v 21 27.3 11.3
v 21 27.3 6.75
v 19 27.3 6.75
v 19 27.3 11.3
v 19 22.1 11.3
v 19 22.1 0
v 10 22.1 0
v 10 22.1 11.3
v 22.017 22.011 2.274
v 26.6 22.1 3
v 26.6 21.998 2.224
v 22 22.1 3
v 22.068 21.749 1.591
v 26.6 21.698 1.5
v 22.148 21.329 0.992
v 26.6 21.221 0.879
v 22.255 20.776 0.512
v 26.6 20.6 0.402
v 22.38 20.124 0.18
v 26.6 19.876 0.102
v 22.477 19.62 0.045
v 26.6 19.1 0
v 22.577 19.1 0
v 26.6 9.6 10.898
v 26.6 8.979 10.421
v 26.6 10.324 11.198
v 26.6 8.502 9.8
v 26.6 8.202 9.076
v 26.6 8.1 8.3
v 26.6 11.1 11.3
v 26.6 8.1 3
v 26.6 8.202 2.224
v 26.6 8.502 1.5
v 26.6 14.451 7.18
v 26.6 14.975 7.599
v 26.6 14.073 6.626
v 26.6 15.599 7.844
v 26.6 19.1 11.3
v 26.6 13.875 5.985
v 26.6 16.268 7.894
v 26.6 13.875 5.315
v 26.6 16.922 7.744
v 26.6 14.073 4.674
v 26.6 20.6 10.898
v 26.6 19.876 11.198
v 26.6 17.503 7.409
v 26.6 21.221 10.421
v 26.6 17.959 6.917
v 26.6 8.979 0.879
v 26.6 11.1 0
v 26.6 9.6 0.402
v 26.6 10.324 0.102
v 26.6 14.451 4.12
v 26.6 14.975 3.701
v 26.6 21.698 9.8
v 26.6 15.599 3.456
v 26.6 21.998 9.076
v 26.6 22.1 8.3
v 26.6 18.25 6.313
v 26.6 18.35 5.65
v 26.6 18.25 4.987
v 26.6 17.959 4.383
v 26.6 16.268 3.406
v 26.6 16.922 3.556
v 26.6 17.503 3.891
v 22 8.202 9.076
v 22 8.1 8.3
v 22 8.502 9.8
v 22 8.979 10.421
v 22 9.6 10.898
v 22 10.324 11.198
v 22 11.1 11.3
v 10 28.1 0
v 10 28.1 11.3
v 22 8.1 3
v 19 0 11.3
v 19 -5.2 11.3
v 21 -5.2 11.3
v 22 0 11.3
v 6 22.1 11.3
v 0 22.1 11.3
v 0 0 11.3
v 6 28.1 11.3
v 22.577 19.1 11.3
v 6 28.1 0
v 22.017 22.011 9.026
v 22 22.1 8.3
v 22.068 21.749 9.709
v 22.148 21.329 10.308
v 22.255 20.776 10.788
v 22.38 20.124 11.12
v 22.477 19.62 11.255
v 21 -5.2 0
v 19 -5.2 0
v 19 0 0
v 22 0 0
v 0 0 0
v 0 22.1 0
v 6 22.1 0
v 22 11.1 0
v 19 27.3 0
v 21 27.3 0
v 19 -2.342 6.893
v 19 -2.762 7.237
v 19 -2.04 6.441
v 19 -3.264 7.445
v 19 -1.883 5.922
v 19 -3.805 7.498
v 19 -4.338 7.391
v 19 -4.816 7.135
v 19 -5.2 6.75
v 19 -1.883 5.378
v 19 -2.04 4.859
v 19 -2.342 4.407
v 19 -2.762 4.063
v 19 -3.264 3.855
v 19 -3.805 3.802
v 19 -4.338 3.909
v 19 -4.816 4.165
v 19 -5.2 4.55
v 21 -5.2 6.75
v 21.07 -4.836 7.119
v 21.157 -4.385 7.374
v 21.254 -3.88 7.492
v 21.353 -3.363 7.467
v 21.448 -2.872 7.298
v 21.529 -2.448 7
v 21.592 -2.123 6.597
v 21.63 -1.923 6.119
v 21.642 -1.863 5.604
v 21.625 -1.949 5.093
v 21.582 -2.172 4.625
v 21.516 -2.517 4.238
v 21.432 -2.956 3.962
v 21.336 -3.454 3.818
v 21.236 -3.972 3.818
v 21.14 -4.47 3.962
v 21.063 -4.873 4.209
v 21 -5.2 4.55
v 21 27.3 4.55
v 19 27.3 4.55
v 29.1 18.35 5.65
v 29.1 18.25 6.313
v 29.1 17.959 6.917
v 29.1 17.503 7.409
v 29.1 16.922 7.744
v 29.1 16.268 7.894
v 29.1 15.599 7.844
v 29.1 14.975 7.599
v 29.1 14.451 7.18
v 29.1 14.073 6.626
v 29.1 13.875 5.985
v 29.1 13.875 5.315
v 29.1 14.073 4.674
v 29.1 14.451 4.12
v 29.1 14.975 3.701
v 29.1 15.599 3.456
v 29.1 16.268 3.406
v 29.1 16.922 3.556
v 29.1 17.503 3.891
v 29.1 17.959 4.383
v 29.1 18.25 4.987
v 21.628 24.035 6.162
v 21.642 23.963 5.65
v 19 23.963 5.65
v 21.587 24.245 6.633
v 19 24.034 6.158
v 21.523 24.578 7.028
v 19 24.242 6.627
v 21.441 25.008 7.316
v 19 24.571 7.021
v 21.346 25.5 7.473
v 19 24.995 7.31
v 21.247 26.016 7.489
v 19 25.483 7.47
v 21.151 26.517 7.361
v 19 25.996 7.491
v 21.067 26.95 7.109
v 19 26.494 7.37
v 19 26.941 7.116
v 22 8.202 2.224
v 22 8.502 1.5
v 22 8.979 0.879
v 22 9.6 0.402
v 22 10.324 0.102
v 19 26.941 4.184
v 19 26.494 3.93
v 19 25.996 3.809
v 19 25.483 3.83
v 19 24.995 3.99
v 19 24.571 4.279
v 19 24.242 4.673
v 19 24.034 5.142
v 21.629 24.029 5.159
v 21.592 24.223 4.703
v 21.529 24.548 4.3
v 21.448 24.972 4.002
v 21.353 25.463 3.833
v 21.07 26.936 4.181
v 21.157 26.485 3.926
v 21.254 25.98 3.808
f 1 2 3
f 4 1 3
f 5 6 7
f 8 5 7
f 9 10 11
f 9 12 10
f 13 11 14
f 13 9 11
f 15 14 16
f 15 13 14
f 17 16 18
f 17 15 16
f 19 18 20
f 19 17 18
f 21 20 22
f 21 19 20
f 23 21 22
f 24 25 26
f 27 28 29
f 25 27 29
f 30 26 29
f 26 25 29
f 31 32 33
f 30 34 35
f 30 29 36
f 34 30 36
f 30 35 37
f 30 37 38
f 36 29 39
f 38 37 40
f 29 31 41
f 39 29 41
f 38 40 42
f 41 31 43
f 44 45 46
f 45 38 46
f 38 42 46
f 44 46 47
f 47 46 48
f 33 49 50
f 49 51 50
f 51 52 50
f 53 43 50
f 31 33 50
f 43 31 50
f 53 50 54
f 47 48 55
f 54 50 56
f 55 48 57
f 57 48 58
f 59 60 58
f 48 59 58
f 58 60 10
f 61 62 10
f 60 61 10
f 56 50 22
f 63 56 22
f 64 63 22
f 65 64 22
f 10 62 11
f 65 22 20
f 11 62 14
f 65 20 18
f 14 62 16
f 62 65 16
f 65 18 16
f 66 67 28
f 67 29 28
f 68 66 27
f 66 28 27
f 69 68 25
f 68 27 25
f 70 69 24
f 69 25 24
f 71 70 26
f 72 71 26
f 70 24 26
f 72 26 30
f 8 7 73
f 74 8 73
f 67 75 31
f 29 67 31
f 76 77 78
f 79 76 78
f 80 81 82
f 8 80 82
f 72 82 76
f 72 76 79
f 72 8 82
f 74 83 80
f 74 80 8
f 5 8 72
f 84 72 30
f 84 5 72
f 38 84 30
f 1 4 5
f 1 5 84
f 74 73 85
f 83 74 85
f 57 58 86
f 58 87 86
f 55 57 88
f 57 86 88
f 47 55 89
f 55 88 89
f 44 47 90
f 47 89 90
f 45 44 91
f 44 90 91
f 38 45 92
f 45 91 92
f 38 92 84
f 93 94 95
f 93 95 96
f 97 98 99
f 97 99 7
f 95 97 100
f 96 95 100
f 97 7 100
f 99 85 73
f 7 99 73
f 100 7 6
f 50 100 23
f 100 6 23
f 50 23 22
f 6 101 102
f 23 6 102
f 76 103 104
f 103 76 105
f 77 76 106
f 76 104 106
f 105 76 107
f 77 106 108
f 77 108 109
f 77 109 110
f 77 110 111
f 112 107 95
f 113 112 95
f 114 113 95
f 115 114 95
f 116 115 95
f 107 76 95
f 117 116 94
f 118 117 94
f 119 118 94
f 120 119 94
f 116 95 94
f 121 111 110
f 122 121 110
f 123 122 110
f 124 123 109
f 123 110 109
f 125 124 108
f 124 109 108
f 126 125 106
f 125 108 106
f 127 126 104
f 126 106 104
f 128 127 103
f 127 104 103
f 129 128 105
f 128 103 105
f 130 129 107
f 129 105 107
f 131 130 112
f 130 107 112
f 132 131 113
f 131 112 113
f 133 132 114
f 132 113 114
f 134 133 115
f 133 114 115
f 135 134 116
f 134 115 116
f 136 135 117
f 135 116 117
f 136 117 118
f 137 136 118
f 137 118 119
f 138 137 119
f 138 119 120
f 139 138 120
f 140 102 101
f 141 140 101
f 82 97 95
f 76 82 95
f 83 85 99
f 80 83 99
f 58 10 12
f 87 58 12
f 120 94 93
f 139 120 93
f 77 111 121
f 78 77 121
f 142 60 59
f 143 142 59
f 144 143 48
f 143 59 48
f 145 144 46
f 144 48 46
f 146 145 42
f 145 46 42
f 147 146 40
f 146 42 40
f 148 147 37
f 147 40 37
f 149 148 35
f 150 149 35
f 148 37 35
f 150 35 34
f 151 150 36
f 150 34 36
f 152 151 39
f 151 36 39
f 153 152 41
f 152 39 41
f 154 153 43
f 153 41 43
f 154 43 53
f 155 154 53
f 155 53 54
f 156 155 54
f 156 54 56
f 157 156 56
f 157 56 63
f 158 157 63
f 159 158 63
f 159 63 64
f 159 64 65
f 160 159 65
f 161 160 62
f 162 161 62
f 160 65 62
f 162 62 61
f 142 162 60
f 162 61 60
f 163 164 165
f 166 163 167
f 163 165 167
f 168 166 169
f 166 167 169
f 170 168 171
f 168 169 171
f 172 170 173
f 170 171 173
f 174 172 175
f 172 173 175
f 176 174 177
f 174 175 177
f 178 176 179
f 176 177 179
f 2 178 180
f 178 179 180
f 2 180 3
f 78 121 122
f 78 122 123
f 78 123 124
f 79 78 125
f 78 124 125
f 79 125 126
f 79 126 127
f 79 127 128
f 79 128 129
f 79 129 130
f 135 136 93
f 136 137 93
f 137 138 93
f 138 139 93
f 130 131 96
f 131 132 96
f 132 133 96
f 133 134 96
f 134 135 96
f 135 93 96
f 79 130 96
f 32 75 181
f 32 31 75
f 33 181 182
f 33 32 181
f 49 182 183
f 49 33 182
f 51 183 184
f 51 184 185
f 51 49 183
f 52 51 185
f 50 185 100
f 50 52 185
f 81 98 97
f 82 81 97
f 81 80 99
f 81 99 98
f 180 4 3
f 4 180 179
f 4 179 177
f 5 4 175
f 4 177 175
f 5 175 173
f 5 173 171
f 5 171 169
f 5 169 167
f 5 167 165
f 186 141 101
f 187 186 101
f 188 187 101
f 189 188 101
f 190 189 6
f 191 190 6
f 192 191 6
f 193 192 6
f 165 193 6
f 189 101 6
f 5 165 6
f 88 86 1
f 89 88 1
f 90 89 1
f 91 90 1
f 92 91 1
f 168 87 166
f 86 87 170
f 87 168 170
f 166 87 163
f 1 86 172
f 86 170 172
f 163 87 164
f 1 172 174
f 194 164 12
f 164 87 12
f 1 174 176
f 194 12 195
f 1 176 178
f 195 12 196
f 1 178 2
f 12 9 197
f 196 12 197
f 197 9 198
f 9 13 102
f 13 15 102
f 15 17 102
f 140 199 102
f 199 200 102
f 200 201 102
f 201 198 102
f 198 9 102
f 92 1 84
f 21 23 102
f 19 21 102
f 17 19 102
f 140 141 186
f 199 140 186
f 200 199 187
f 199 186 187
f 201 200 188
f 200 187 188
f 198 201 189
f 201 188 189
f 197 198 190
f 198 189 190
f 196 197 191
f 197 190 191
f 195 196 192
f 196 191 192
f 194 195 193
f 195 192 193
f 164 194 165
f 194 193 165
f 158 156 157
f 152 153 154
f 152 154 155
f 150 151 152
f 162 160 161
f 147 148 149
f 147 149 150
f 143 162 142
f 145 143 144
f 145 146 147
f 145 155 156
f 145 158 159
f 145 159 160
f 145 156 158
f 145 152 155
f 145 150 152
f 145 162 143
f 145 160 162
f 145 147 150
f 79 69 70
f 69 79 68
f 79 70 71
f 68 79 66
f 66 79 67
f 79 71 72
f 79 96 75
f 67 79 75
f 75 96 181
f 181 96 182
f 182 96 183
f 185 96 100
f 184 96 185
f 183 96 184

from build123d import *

# Parameters (mm, degrees)
F1_DEPTH = 11.3
F2_R     = 3
F3_R     = 2.25
F4_DEPTH = 2.5
F6_DEPTH = 25


# Not quite as in the source:
# - a feature names something its author has since deleted; it is built from what else it names


with BuildPart() as f1:
    # F0 (on Top) → F1 (new body)
    with BuildSketch(Plane.XY):
        Polygon((0, 22.1), (0, 0), (19, 0), (19, -5.2), (21, -5.2), (22, 0), (22, 8.1), (26.6, 8.1), (26.6, 22.1), (22, 22.1), (21, 27.3), (19, 27.3), (19, 22.1), (10, 22.1), (10, 28.1), (6, 28.1), (6, 22.1), align=None)
    extrude(amount=F1_DEPTH)

    # F2
    f2_edges = [f1.edges().sort_by_distance(p)[0] for p in [
        (24.3, 8.1, 0),
        (24.3, 8.1, 11.3),
        (24.3, 22.1, 11.3),
        (24.3, 22.1, 0),
    ]]
    fillet(f2_edges, radius=F2_R)

    # F3 (on face) → F4 (join)
    with BuildSketch(Plane.YZ.offset(26.6)):
        with Locations((16.1, 5.65)):
            Circle(F3_R)
    extrude(amount=F4_DEPTH)

    # F5 (on face) → F6 (cut)
    with BuildSketch(Plane(origin=(19, 0, 0), x_dir=(0, -1, 0), z_dir=(-1, 0, 0))):
        with BuildLine():
            Line((5.2, 4.55), (5.2, 6.75))
            ThreePointArc((5.2, 6.75), (1.8625525219, 5.65), (5.2, 4.55))
        make_face()
        with BuildLine():
            ThreePointArc((-27.3, 4.55), (-25.2334488328, 3.8929744119), (-23.9625525219, 5.65))
            ThreePointArc((-23.9625525219, 5.65), (-25.2334488328, 7.4070255881), (-27.3, 6.75))
            Line((-27.3, 6.75), (-27.3, 4.55))
        make_face()
    extrude(amount=-F6_DEPTH, mode=Mode.SUBTRACT)


solid = f1.part
